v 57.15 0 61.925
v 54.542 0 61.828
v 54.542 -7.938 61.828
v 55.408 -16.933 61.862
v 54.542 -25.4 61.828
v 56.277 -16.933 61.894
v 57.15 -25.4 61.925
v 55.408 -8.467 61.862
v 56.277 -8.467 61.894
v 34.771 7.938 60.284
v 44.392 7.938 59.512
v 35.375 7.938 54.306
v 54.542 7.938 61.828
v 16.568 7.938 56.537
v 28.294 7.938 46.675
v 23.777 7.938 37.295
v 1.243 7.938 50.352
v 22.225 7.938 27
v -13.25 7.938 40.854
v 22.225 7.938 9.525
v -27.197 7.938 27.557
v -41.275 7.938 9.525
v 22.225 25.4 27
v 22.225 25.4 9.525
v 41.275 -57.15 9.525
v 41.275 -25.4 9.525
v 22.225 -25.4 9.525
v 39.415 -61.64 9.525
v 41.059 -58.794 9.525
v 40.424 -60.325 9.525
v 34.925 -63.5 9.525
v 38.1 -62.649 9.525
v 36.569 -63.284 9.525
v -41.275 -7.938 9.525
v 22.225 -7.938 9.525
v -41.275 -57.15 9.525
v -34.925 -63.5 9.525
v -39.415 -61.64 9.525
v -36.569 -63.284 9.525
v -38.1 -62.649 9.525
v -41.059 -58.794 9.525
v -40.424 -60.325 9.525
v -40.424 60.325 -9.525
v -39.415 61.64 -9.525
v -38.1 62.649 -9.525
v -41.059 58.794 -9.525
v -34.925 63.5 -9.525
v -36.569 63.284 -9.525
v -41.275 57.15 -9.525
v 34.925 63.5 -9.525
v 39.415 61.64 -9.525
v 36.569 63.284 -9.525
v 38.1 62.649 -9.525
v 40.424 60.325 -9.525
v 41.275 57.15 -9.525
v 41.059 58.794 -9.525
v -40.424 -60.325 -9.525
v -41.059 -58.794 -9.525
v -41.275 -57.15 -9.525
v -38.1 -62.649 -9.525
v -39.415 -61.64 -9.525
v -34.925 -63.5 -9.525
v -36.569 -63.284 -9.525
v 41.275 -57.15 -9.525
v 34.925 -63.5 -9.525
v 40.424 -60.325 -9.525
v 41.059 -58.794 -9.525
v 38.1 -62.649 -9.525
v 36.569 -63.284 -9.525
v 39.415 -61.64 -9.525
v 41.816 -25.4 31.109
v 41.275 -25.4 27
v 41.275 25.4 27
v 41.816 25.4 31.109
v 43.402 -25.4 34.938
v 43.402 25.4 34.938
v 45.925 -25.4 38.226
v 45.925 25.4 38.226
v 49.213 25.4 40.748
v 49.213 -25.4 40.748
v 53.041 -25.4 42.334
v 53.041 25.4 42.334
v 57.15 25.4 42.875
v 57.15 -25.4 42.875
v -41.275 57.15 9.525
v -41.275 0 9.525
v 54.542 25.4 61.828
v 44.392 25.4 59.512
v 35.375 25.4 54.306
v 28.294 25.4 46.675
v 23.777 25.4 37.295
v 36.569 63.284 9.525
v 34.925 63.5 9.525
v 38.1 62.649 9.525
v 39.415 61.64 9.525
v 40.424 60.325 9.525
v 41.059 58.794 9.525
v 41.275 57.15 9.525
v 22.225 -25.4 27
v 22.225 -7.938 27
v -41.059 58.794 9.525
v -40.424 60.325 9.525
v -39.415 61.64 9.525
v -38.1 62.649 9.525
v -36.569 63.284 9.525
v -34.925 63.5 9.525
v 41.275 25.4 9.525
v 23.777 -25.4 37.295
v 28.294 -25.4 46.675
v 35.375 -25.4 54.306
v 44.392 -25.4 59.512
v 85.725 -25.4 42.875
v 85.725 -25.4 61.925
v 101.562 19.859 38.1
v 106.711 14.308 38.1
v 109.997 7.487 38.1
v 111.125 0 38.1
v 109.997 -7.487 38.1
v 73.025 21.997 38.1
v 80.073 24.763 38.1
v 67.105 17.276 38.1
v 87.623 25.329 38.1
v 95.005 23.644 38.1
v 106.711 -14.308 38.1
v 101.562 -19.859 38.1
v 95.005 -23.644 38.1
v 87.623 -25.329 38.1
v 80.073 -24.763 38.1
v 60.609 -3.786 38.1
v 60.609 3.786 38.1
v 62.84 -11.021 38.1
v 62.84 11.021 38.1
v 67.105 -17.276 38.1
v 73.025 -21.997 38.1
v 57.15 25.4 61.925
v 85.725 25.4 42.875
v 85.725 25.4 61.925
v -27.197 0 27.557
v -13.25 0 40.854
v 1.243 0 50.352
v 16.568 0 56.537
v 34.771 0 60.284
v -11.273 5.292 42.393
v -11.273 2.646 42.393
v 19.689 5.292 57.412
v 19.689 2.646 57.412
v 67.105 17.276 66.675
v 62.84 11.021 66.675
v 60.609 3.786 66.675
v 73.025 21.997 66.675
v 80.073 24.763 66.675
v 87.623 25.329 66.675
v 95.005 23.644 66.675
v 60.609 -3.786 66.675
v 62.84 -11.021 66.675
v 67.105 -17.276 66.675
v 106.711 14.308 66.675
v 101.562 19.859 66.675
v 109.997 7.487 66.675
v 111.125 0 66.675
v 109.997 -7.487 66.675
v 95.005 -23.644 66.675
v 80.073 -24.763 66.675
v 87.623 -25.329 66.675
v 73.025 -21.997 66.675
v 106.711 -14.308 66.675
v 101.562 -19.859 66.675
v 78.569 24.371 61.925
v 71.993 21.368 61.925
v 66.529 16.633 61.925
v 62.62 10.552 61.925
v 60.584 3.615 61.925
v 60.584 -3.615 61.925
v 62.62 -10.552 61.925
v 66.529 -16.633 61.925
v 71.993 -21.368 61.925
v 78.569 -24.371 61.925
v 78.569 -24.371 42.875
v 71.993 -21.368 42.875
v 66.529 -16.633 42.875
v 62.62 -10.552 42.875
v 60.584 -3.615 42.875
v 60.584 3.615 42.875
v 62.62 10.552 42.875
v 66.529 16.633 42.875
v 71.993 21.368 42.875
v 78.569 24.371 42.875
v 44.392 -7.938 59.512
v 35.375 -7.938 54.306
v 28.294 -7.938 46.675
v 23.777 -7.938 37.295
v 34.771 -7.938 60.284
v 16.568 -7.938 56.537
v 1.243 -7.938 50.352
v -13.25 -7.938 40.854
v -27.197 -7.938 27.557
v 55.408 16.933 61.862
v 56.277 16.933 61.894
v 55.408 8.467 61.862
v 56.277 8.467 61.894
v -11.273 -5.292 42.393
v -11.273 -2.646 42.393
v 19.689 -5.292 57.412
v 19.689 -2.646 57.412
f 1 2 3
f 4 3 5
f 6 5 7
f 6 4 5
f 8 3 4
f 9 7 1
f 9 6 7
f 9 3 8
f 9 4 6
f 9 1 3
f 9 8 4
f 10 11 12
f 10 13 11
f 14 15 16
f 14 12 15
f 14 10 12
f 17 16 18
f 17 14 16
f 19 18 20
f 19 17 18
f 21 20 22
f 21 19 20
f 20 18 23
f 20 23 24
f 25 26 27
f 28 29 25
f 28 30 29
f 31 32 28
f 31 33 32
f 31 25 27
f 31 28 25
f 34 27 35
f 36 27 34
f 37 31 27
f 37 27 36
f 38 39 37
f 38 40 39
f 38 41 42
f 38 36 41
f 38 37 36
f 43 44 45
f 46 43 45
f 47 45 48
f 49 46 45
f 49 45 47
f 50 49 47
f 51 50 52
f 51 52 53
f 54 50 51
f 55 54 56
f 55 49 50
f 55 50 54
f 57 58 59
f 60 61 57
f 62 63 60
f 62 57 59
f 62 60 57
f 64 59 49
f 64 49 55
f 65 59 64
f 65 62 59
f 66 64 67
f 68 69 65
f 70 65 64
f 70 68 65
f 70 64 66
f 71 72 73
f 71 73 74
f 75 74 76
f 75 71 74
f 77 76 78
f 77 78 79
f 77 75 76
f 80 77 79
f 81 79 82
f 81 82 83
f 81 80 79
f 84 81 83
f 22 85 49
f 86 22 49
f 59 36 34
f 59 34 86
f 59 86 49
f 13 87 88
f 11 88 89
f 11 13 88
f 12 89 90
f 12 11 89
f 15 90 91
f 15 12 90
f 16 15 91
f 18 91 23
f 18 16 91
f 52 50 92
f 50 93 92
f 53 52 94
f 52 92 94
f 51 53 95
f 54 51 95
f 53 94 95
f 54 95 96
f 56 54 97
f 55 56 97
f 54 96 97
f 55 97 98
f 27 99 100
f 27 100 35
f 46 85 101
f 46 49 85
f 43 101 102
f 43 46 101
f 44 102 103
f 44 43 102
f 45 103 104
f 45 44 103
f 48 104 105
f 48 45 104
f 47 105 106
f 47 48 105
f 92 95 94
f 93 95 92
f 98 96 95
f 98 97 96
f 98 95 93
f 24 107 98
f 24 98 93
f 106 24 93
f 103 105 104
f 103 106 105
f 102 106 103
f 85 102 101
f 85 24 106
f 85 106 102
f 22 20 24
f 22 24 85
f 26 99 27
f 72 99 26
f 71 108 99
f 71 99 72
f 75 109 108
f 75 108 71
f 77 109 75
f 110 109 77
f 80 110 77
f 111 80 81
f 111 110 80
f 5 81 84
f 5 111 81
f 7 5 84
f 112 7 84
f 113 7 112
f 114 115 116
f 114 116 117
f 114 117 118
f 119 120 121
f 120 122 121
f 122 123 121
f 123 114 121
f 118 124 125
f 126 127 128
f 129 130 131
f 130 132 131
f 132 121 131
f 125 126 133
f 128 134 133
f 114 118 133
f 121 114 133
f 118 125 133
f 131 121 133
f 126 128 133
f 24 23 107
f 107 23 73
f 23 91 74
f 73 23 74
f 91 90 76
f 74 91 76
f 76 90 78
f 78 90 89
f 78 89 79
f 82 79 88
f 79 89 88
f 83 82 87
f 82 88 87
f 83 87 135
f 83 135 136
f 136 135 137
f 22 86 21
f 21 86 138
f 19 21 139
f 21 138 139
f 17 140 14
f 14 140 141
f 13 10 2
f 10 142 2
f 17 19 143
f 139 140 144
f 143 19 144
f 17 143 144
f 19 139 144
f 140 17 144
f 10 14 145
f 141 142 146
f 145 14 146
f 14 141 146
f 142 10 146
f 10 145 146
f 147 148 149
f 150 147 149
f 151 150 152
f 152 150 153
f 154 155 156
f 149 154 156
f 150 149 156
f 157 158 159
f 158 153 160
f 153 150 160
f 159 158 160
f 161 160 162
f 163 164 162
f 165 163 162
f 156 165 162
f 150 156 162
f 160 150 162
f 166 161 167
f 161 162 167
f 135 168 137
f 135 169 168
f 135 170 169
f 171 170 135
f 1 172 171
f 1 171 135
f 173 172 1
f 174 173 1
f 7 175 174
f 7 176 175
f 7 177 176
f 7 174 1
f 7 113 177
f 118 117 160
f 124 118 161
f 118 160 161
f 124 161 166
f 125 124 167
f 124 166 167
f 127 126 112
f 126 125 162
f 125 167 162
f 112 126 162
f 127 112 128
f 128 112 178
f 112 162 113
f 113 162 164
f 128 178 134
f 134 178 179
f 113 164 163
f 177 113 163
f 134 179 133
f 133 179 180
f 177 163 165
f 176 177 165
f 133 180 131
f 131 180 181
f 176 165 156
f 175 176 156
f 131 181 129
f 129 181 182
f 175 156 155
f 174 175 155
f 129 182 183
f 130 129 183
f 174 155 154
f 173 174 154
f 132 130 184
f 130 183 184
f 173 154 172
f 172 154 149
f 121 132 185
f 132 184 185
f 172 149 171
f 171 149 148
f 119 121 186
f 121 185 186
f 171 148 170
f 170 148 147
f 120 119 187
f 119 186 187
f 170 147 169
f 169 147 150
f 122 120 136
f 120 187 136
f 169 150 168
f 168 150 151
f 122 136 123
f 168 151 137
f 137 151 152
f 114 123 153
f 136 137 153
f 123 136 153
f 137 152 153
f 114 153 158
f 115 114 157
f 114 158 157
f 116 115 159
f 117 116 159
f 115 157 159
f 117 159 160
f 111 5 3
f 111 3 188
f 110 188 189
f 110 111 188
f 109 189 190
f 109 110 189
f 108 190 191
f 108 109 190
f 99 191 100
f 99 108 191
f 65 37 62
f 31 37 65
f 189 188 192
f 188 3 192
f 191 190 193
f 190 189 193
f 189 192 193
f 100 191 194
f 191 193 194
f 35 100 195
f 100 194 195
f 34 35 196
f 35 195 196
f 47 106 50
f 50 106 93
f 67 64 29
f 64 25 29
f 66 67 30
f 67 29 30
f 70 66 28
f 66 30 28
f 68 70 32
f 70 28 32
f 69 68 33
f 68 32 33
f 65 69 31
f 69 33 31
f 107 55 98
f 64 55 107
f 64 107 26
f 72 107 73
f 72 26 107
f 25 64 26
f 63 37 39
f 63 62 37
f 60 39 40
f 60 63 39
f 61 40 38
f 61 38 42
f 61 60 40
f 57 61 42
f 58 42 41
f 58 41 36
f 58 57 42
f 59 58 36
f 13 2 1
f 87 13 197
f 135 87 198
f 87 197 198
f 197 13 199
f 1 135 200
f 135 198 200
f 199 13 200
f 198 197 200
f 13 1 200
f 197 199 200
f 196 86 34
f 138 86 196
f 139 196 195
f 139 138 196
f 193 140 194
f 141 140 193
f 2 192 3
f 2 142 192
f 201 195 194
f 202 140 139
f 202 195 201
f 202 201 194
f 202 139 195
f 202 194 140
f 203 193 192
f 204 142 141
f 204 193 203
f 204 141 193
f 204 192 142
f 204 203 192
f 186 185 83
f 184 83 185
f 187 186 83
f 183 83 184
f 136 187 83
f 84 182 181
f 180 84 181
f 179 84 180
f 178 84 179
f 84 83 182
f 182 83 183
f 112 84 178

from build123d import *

# Parameters (mm, degrees)
F1_DEPTH = 63.5
F0_W     = 25.4
F0_H     = 19.05
F2_DEPTH = 25.4
F3_DEPTH = 7.9375
F5_R     = 6.35
F6_R     = 6.35
F7_R     = 6.35
F8_R     = 6.35


# Not quite as in the source:
# - a feature names something its author has since deleted; it is built from what else it names


with BuildPart() as f1:
    # F0 (on Front) → F1 (new body, symmetric)
    with BuildSketch(Plane.XZ):
        Polygon((22.225, 9.525), (-41.275, 9.525), (-41.275, -9.525), (41.275, -9.525), (41.275, 9.525), align=None)
    extrude(amount=F1_DEPTH, both=True)

    # F0 (on Front) → F2 (join, symmetric)
    with BuildSketch(Plane.XZ):
        with BuildLine():
            Line((22.225, 27.0002), (22.225, 9.525))
            Line((22.225, 9.525), (41.275, 9.525))
            Line((41.275, 9.525), (41.275, 27.0002))
            ThreePointArc((41.275, 27.0002), (45.9246798487, 38.2255201513), (57.15, 42.8752))
            Line((57.15, 42.8752), (60.325, 42.8752))
            Line((60.325, 42.8752), (60.325, 61.9252))
            Line((60.325, 61.9252), (57.15, 61.9252))
            add(Edge.make_bspline(
                [(54.5418748685, 61.8276792125), (55.4058435477, 61.8626883172), (56.2751659775, 61.8950651933), (57.15, 61.9252)],
                knots=[109.0113637744, 109.0113637744, 109.0113637744, 109.0113637744, 111.5045361635, 111.5045361635, 111.5045361635, 111.5045361635], degree=3))
            ThreePointArc((54.5418748685, 61.8276792125), (31.5487852318, 50.7559030498), (22.225, 27.0002))
        make_face()
        with Locations((73.025, 52.4002)):
            Rectangle(F0_W, F0_H)
    extrude(amount=F2_DEPTH, both=True)

    # F0 (on Front) → F3 (join, symmetric)
    with BuildSketch(Plane.XZ):
        with BuildLine():
            add(Edge.make_bspline(
                [(-41.275, 9.525), (-10.7751676539, 53.7339523615), (16.7657449889, 60.2969426058), (54.5418748685, 61.8276792125)],
                knots=[0, 0, 0, 0, 109.0113637744, 109.0113637744, 109.0113637744, 109.0113637744], degree=3))
            Line((-41.275, 9.525), (22.225, 9.525))
            Line((22.225, 9.525), (22.225, 27.0002))
            ThreePointArc((22.225, 27.0002), (31.5487852318, 50.7559030498), (54.5418748685, 61.8276792125))
        make_face()
    extrude(amount=F3_DEPTH, both=True)

    # F0 (on Front) → F4 (revolve)
    with BuildSketch(Plane.XZ):
        Polygon((85.725, 66.675), (85.725, 61.9252), (85.725, 42.8752), (85.725, 38.1), (111.125, 38.1), (111.125, 66.675), align=None)
    revolve(axis=Axis((85.725, 0, 52.3875), (0, 0, -1)))

    # F5
    f5_edges = [f1.edges().sort_by_distance(p)[0] for p in [
        (41.275, -63.5, 0),
    ]]
    fillet(f5_edges, radius=F5_R)

    # F6
    f6_edges = [f1.edges().sort_by_distance(p)[0] for p in [
        (-41.275, -63.5, 0),
    ]]
    fillet(f6_edges, radius=F6_R)

    # F7
    f7_edges = [f1.edges().sort_by_distance(p)[0] for p in [
        (-41.275, 63.5, 0),
    ]]
    fillet(f7_edges, radius=F7_R)

    # F8
    f8_edges = [f1.edges().sort_by_distance(p)[0] for p in [
        (41.275, 63.5, 0),
    ]]
    fillet(f8_edges, radius=F8_R)


solid = f1.part
